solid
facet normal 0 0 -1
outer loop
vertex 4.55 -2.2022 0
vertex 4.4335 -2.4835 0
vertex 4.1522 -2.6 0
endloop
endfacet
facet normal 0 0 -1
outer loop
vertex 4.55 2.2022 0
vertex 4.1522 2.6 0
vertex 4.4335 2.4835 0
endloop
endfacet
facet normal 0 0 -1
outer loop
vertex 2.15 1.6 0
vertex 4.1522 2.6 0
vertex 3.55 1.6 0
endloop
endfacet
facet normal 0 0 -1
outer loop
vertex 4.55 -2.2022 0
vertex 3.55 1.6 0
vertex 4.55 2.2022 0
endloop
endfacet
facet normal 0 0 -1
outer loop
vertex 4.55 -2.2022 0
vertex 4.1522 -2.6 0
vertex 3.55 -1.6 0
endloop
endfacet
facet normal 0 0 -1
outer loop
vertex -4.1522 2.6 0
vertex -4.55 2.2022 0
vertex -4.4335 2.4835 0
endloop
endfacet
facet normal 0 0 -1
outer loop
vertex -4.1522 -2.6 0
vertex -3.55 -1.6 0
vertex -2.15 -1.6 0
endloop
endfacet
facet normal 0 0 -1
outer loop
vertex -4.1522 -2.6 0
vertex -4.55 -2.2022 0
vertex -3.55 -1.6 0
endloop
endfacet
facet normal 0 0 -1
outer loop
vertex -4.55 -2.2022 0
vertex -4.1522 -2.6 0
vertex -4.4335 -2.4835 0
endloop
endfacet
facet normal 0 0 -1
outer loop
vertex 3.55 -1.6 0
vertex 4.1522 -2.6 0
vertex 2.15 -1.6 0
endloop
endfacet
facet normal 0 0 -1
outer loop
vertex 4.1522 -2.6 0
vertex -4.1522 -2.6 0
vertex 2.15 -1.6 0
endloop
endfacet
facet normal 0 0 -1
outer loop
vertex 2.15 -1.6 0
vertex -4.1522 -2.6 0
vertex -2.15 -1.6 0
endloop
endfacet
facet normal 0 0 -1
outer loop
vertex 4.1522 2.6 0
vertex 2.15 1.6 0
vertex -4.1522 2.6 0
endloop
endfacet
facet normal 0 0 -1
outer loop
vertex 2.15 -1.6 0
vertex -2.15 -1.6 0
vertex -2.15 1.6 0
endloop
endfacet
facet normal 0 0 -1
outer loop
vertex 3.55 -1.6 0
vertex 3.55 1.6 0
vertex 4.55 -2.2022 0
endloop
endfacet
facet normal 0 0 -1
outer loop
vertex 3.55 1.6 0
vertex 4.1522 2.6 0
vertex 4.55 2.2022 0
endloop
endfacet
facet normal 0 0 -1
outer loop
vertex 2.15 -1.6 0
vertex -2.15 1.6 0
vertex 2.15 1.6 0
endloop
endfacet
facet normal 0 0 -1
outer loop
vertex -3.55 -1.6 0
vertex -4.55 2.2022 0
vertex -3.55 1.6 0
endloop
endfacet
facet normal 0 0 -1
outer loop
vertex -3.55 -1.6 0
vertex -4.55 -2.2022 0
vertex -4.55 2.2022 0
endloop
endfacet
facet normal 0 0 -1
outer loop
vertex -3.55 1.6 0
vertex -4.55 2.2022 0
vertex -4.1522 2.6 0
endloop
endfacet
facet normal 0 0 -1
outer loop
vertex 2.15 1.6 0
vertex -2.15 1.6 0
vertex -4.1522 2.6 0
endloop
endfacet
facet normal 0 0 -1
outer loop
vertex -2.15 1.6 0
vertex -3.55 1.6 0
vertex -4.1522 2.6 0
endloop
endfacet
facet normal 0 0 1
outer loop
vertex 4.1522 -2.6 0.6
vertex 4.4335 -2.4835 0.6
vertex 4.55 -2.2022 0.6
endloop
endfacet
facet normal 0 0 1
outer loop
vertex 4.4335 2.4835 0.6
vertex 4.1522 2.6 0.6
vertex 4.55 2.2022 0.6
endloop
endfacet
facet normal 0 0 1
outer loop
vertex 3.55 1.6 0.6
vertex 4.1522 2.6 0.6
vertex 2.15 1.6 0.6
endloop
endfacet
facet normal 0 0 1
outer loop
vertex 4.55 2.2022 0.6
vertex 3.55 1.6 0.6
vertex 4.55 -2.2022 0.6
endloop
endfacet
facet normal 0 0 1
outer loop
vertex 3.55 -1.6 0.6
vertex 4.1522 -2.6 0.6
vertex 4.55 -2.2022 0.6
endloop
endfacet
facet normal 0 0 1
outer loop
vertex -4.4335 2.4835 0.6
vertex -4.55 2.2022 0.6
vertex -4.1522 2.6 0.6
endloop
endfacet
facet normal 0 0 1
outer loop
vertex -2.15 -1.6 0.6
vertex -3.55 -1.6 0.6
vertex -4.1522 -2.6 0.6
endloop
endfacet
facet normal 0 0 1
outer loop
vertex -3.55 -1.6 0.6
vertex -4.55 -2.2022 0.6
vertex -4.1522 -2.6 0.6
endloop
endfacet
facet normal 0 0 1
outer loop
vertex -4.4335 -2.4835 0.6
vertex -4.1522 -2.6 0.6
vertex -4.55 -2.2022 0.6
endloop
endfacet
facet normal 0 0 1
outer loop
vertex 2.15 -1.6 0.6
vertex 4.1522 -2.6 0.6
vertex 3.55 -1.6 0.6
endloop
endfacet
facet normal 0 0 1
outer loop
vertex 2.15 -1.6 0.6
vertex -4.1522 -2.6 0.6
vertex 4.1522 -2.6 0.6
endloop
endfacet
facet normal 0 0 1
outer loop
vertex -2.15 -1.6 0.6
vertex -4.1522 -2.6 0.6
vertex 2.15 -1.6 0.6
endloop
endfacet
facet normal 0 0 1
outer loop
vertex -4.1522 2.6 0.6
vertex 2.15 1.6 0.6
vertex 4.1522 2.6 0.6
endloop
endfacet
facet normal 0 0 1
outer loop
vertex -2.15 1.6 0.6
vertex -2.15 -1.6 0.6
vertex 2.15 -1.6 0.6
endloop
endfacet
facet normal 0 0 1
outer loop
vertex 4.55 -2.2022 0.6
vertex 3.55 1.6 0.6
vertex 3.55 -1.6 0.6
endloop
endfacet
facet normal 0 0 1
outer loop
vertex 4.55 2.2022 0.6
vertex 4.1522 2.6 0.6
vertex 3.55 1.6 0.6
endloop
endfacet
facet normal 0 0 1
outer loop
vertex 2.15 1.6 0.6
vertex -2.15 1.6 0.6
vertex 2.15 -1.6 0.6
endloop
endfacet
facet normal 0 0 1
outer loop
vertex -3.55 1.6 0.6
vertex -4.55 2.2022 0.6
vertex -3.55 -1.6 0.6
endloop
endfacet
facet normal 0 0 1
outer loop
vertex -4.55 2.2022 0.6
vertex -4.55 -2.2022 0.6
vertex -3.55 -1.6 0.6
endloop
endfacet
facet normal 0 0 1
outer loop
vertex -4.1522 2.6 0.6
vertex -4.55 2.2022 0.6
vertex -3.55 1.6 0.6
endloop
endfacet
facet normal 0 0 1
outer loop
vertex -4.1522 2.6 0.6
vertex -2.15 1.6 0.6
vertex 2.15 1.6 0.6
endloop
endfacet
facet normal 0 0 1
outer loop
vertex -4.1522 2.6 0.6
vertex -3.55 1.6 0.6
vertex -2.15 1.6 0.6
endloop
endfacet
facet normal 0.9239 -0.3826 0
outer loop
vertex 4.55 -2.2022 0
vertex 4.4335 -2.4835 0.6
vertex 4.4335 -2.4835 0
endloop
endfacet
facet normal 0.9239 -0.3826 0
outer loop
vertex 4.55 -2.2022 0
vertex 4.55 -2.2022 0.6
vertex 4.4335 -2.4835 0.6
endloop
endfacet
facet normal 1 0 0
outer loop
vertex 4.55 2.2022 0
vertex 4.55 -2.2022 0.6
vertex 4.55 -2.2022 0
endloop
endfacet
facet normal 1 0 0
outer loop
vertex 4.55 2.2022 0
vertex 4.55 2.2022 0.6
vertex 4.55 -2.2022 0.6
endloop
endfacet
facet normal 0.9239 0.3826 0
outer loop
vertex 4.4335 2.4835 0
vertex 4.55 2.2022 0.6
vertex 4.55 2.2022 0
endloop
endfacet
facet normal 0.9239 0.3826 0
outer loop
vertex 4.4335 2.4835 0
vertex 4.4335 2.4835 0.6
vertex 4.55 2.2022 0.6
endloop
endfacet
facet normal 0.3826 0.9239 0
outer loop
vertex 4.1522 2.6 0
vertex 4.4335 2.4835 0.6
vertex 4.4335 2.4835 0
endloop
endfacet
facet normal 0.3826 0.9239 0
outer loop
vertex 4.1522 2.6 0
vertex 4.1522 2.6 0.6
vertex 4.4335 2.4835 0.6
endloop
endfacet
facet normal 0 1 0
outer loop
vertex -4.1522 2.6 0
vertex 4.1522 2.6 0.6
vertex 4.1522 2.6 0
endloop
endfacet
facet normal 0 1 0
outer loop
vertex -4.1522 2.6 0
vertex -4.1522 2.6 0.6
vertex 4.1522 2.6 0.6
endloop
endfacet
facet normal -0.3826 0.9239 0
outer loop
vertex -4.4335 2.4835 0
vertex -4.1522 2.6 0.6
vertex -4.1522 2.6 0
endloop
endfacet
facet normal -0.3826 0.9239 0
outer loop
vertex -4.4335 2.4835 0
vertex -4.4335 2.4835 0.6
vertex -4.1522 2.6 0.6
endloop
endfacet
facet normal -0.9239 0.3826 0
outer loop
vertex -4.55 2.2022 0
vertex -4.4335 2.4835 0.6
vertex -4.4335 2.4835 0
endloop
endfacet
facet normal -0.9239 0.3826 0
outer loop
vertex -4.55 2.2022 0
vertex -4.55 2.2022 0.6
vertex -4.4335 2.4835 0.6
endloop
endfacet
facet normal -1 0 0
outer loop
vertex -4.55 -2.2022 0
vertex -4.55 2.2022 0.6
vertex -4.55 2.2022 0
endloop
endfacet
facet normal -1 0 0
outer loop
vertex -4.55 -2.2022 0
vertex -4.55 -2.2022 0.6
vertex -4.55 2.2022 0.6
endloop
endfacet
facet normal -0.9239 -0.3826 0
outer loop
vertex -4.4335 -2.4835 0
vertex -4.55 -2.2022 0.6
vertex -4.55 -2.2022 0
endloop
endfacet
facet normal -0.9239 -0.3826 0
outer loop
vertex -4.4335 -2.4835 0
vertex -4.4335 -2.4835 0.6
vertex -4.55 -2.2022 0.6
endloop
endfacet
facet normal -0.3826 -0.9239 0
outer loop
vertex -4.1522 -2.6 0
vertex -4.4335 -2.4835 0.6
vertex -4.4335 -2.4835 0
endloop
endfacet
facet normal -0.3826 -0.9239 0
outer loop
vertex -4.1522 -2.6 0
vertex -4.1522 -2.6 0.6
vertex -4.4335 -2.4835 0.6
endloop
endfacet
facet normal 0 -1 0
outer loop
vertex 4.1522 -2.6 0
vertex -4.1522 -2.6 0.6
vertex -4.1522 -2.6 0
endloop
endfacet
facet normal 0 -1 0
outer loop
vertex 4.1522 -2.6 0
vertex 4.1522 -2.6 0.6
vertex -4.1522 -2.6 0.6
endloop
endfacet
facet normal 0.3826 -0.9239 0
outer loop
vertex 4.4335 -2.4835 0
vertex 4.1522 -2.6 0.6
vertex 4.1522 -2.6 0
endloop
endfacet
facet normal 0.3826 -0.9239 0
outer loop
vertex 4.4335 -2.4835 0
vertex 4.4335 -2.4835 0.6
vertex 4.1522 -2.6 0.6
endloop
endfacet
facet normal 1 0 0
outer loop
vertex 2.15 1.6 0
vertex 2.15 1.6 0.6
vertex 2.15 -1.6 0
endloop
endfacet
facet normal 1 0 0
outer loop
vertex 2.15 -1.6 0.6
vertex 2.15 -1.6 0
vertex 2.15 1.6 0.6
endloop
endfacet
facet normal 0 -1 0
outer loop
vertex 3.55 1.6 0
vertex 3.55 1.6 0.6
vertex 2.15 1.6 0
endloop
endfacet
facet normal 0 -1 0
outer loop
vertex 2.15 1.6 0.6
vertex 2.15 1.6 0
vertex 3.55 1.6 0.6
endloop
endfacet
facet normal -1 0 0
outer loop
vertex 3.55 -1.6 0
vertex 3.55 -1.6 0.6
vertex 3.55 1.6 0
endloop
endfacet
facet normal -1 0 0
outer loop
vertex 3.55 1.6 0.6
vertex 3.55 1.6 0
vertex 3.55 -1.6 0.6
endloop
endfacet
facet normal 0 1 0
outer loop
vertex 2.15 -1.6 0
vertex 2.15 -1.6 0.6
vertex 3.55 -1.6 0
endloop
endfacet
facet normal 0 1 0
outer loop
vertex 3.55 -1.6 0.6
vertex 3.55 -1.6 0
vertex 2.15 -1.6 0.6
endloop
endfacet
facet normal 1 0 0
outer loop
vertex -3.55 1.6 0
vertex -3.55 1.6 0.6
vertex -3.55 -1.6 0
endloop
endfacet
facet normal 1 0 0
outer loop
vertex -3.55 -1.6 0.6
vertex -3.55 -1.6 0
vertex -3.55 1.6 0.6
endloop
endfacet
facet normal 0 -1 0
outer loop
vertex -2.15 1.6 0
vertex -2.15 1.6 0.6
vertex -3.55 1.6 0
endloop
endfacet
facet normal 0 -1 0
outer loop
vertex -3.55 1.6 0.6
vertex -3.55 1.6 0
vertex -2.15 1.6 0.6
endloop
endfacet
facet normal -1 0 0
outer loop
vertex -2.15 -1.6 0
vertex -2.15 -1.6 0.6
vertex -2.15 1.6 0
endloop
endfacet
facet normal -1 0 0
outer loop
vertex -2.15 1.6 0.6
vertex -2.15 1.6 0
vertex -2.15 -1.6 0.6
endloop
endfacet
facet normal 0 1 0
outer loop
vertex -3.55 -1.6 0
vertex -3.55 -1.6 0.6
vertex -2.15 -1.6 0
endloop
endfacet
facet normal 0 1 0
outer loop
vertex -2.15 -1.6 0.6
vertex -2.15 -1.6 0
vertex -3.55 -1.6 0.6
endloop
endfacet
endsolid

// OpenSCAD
module scuf_feet_outline() {
    width = 36;
    diameter = 6;
    
    hull() {
        translate([width/2, 0, 0])
        circle(d=diameter);
        translate([-width/2, 0, 0])
        circle(d=diameter);
    }
    
}

module scuf_feet_detent() {
    translate([0, 0, 0.5])
    mirror([0, 0, 1])
    linear_extrude(0.5, convexity=5, scale=[42.2/42, 6.2/6]) // 0.1mm chamfer
    scuf_feet_outline();
}

module choc_v1_keycap_spacer(depth=0.6) {
    hole_size = [1.4, 3.2];
    x_distance = 5.7;
    fillet_radius = 2;
    $fn=8;
    linear_extrude(depth, convexity=5)
    difference() {
        offset(delta=-fillet_radius)
        offset(r=fillet_radius)
        square([x_distance+hole_size.x+2, hole_size.y+2], center = true);
        
        translate([x_distance/2, 0, 0])
        square(hole_size, center = true);
        
        translate([-x_distance/2, 0, 0])
        square(hole_size, center = true);
    }
}

//scuf_feet_detent();
choc_v1_keycap_spacer();
